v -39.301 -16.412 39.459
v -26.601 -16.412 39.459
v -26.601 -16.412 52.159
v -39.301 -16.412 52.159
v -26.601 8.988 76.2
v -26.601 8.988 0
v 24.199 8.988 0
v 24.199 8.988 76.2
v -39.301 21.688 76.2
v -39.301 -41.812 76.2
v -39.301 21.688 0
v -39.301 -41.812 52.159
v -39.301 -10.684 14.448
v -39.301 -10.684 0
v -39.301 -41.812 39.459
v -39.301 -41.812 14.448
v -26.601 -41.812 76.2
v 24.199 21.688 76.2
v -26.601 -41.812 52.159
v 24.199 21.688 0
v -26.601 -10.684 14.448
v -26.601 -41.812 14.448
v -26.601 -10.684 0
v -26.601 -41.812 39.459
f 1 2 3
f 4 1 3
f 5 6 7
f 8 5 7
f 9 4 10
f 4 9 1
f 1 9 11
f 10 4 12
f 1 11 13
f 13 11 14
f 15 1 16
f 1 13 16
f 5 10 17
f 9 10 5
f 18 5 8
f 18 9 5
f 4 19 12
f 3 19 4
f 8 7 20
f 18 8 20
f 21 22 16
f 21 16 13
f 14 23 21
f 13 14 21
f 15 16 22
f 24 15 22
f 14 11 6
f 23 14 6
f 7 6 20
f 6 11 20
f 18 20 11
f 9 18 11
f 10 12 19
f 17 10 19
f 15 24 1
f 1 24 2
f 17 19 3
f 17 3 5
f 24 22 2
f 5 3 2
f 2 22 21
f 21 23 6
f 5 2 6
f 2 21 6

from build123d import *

# Parameters (mm, degrees)
F1_DEPTH = 76.2
F2_W     = 31.1273433149
F2_H     = 14.4479367882
F3_DEPTH = 25.4
F4_W     = 25.4
F4_H     = 12.7
F5_DEPTH = 25.4


with BuildPart() as f1:
    # F0 (on Top) → F1 (new body)
    with BuildSketch(Plane.XY):
        Polygon((-39.3005906213, 21.688469161), (-39.3005906213, -41.811530839), (-26.6005906213, -41.811530839), (-26.6005906213, 8.988469161), (24.1994093787, 8.988469161), (24.1994093787, 21.688469161), align=None)
    extrude(amount=F1_DEPTH)

    # F2 (on face) → F3 (cut)
    with BuildSketch(Plane.YZ.offset(-26.6005906213)):
        with Locations((-26.2478591815, 7.2239683941)):
            Rectangle(F2_W, F2_H)
    extrude(amount=-F3_DEPTH, mode=Mode.SUBTRACT)

    # F4 (on face) → F5 (cut)
    with BuildSketch(Plane.YZ.offset(-26.6005906213)):
        with Locations((-29.111530839, 45.8086510956)):
            Rectangle(F4_W, F4_H)
    extrude(amount=-F5_DEPTH, mode=Mode.SUBTRACT)


solid = f1.part
